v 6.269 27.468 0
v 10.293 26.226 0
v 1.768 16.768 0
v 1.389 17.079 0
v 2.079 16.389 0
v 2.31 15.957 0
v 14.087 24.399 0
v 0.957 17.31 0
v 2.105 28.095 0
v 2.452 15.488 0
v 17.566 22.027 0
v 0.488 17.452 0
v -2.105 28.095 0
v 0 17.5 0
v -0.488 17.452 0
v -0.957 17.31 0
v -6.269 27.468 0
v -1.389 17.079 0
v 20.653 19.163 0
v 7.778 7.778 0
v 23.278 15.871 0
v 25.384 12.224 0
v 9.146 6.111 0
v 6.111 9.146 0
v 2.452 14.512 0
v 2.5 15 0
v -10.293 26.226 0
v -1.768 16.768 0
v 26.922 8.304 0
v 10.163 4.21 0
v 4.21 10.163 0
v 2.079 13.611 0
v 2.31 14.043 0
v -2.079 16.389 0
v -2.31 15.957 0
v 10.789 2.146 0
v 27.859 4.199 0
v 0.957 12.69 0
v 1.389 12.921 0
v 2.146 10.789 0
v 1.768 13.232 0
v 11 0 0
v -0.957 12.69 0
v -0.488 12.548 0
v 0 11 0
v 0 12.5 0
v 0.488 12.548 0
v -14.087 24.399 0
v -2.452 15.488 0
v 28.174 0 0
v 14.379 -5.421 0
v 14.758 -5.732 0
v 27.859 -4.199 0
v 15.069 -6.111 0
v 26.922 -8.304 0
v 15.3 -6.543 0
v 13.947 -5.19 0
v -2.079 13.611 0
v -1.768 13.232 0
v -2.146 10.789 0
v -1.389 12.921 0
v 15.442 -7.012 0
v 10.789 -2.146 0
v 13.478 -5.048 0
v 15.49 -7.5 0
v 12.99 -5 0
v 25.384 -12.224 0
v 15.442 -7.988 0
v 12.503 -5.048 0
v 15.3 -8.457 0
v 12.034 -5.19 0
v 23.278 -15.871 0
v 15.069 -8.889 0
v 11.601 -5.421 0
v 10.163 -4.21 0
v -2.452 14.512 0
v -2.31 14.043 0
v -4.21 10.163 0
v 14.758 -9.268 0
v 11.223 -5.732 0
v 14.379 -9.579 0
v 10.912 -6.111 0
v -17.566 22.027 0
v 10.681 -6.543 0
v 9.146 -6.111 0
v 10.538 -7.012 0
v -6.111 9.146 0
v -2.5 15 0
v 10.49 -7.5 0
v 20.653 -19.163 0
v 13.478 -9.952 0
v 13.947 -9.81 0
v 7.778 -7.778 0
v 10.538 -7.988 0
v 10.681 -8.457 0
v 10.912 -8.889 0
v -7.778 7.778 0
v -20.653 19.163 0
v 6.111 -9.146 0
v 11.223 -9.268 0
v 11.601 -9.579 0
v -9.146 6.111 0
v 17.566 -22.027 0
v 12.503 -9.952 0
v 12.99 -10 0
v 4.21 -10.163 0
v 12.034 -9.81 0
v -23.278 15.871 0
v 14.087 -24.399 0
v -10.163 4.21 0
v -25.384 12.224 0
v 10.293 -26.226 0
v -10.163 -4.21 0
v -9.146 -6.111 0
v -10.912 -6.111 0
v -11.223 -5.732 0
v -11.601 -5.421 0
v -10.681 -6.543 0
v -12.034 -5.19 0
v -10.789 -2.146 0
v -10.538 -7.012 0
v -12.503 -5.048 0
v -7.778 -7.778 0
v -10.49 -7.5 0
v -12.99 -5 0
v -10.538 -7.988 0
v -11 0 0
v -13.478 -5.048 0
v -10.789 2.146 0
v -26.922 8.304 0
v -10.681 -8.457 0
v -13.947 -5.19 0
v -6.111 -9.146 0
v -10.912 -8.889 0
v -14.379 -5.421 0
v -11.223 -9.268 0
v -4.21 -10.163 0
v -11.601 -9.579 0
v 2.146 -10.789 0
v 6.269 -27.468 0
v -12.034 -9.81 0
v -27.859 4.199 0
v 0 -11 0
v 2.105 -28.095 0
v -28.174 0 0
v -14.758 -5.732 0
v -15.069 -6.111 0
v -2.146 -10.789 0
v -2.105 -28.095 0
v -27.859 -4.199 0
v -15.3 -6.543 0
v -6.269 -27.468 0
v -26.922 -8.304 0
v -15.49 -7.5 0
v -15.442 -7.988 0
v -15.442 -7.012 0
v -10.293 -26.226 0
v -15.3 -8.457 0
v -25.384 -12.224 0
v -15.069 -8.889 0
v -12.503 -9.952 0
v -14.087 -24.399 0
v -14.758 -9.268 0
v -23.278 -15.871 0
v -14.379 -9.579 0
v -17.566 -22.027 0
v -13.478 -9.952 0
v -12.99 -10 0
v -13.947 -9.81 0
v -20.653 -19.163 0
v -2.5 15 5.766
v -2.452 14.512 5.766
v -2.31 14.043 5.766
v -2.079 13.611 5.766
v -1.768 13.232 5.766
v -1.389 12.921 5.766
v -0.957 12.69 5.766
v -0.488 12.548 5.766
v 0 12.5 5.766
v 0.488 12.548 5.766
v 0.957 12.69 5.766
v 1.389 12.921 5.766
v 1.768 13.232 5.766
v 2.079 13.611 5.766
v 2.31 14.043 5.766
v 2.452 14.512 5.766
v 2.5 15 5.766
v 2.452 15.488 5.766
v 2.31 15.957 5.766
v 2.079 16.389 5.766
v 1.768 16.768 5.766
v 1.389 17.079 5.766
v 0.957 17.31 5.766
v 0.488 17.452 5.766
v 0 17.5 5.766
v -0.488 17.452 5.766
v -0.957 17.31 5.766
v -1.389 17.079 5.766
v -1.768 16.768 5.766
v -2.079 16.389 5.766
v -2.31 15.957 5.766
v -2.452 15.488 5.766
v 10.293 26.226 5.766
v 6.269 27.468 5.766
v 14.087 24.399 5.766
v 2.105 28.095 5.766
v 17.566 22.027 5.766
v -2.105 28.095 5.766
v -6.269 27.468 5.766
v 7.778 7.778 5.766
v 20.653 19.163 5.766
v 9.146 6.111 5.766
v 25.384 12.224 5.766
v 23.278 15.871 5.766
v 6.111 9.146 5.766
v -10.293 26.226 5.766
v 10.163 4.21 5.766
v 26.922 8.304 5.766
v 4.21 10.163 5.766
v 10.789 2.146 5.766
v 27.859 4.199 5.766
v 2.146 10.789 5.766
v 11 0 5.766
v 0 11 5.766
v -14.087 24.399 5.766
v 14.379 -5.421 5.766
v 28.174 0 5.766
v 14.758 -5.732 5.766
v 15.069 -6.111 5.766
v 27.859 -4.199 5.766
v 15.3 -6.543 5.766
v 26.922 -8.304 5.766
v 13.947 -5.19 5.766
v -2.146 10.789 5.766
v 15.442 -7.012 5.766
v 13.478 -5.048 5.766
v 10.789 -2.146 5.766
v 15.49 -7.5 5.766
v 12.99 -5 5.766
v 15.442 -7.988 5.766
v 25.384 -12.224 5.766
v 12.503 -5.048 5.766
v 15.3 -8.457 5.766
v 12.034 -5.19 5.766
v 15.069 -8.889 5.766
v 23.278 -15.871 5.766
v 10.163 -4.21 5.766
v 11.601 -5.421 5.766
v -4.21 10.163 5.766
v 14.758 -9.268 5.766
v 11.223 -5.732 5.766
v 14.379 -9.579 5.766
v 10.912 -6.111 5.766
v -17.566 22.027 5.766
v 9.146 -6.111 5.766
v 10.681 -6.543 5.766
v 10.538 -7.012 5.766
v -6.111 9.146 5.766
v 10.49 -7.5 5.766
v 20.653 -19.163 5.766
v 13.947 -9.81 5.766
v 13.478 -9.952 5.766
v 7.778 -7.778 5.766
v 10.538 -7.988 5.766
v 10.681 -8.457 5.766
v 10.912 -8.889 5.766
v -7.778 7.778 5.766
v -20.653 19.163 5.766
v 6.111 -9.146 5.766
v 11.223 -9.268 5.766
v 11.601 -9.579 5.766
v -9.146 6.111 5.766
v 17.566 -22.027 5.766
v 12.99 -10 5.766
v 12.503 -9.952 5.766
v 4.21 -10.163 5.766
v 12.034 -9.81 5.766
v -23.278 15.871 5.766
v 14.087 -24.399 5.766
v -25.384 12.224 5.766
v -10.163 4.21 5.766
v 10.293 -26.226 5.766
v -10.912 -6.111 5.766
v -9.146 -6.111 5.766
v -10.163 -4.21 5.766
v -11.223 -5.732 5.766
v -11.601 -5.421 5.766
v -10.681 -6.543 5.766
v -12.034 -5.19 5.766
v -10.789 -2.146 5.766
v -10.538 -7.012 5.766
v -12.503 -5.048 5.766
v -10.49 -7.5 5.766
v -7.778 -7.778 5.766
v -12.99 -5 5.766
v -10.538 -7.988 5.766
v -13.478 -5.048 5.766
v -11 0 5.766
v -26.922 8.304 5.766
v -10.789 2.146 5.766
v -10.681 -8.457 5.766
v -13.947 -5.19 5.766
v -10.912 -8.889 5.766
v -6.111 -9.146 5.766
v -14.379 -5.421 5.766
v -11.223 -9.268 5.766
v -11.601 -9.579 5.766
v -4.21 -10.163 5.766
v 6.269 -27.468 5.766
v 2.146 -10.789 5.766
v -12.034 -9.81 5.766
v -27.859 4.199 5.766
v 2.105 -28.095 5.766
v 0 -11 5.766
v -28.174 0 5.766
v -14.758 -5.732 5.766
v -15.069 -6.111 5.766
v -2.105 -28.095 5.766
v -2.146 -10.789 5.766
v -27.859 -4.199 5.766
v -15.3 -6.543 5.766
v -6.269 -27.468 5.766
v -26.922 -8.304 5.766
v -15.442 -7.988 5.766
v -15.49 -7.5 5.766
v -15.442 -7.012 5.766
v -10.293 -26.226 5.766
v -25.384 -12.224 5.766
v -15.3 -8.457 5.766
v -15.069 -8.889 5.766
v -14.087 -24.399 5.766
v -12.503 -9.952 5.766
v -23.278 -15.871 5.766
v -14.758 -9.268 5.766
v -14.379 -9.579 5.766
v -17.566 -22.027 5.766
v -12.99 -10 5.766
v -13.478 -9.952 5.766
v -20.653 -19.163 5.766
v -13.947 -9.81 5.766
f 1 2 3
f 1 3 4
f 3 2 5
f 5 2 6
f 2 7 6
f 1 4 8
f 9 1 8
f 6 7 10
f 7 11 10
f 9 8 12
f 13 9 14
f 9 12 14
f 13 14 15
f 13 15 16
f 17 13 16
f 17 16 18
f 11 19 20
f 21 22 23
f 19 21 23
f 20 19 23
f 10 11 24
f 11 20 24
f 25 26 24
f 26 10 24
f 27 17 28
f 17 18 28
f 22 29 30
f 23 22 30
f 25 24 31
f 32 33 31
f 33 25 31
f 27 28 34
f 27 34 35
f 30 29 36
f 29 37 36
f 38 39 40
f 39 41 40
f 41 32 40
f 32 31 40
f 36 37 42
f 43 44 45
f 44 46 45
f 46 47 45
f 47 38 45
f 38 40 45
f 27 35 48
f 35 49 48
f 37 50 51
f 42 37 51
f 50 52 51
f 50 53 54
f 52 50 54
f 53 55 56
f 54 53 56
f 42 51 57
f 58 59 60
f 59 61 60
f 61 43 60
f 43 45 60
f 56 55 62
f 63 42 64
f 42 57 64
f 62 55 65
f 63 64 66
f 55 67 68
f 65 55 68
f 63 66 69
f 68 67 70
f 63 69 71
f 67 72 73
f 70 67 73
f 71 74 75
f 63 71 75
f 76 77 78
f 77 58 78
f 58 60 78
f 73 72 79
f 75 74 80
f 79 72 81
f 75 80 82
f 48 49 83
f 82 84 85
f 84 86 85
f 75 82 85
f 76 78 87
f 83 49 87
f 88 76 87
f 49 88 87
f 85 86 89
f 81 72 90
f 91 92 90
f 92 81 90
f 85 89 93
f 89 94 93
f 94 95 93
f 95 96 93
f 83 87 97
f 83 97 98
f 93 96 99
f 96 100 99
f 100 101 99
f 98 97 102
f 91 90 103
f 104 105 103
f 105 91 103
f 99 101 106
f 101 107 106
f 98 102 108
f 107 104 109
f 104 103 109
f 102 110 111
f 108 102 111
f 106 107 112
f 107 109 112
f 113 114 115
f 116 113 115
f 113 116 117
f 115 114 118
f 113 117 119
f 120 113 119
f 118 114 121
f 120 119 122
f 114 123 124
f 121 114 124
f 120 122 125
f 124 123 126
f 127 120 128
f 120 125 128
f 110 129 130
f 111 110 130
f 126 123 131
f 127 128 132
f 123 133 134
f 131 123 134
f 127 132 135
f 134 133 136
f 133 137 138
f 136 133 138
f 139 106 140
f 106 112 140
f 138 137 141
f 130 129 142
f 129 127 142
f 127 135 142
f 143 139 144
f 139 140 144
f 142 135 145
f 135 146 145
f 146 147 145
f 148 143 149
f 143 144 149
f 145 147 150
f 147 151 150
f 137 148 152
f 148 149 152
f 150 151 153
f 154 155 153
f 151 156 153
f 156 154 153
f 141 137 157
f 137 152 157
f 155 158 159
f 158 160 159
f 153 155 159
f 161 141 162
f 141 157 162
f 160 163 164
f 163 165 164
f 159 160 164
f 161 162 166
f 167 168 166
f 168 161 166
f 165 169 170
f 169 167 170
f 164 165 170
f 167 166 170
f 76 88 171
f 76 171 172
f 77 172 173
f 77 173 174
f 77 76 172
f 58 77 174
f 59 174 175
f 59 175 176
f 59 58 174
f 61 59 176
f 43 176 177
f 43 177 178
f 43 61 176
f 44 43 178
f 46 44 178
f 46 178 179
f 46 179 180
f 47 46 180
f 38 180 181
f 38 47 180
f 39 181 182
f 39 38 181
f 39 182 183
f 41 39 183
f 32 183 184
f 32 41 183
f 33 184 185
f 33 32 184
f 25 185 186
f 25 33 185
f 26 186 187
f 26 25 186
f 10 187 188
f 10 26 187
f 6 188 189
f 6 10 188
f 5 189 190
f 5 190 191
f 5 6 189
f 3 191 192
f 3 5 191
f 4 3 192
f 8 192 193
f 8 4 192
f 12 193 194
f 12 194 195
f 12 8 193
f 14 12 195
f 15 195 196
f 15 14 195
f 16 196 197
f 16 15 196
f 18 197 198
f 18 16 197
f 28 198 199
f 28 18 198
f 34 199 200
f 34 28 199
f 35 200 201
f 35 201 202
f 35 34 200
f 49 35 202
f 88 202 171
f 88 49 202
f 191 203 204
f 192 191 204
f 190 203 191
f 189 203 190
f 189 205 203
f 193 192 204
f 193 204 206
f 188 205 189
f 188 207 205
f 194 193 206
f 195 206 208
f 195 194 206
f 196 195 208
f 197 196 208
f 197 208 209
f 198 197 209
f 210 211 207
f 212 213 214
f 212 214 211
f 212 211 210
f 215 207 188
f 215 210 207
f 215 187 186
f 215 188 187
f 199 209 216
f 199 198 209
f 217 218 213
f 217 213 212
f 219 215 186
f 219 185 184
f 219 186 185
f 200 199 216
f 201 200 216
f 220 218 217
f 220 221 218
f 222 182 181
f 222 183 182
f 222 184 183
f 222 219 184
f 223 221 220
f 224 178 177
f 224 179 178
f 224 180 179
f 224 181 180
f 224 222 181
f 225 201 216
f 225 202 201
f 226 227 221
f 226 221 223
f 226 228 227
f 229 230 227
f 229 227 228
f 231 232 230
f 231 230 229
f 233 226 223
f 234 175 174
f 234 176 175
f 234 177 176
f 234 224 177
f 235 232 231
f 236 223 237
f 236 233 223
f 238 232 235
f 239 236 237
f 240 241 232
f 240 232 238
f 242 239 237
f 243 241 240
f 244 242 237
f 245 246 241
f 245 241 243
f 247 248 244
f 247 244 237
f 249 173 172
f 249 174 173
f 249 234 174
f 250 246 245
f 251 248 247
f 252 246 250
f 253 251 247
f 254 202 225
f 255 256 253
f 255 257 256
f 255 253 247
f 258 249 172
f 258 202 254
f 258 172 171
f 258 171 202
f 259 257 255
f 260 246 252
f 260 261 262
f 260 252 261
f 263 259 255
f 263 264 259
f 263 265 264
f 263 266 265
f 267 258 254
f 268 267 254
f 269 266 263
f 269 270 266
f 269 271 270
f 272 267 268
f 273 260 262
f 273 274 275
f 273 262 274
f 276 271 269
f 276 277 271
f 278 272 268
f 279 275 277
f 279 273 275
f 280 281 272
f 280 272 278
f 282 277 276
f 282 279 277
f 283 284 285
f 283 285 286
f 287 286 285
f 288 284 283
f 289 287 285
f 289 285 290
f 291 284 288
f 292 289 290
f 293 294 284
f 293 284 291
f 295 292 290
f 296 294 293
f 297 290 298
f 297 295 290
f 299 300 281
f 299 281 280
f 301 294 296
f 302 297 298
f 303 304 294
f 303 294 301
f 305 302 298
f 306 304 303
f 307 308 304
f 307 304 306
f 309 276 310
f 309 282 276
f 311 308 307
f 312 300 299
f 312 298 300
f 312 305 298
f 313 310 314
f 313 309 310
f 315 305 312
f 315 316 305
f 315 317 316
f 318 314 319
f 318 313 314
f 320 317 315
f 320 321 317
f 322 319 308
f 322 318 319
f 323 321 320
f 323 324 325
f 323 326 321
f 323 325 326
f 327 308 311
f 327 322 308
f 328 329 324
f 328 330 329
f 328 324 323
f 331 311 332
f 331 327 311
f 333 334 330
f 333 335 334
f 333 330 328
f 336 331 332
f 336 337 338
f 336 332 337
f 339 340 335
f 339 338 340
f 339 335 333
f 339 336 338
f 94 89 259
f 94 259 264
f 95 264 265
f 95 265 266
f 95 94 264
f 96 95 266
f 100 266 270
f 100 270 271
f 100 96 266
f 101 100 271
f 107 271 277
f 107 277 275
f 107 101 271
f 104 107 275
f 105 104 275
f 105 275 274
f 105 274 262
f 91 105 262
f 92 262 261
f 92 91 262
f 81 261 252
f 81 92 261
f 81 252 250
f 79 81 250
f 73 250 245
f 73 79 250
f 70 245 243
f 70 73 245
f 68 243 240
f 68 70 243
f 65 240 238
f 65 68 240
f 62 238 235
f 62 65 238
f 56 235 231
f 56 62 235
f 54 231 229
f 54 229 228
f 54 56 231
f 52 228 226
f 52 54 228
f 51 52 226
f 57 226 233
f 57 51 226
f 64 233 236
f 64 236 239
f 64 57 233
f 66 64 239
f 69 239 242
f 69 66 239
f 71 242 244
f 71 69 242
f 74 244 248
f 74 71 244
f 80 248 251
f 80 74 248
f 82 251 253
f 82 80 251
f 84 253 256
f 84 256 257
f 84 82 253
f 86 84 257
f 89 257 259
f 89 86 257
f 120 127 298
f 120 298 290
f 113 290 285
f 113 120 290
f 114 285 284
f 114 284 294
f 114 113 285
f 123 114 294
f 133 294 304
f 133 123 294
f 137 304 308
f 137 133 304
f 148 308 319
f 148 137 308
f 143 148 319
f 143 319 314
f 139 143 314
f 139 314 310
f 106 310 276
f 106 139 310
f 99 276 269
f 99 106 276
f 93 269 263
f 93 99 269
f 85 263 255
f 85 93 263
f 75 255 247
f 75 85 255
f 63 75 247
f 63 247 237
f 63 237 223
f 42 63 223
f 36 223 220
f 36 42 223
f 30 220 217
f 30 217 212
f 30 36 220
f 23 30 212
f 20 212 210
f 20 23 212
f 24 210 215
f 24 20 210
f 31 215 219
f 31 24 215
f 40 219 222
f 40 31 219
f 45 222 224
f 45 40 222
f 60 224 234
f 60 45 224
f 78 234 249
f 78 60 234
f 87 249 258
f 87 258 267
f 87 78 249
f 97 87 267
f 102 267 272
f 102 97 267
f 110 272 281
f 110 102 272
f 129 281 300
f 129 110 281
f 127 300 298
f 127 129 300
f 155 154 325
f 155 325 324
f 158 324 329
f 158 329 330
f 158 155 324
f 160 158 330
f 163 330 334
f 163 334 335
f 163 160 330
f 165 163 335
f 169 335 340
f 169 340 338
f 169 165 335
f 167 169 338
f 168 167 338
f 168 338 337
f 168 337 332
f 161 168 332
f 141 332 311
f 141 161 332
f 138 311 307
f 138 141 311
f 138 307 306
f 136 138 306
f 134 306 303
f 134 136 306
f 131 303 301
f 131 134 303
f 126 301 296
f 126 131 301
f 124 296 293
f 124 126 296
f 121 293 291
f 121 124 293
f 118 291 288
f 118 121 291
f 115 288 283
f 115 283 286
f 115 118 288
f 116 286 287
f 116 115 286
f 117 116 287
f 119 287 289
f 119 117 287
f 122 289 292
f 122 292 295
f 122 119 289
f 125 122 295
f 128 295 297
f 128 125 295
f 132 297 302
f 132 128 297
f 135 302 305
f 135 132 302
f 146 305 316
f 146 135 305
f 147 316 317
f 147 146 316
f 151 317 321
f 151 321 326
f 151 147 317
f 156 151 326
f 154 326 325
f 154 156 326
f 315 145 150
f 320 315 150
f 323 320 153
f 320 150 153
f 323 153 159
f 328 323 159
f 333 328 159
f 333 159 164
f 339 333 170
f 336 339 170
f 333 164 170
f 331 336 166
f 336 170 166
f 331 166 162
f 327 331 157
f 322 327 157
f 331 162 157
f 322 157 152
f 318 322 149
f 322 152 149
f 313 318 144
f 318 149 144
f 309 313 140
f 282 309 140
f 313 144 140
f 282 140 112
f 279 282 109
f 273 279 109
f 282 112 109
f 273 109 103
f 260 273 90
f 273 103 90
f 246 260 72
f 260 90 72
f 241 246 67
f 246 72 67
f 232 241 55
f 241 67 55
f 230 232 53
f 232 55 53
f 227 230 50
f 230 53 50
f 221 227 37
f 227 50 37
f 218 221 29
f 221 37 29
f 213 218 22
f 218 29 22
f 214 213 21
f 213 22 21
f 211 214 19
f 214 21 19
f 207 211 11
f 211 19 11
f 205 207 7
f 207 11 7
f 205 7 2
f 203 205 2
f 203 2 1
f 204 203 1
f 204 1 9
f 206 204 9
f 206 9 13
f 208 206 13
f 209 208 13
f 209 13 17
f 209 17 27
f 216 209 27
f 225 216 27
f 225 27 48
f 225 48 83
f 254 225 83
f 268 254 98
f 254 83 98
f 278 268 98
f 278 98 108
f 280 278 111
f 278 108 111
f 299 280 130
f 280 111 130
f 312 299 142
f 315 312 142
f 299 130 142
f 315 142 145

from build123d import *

# Parameters (mm, degrees)
SKETCH1_R           = 28.173882667
SKETCH1_R_2         = 2.5
SKETCH1_R_3         = 11
BOSS_EXTRUDE1_DEPTH = 5.7658


with BuildPart() as part:
    # Sketch1 → Boss-Extrude1 (new body)
    with BuildSketch(Plane.XY):
        Circle(SKETCH1_R)
        with Locations((0, 15)):
            Circle(SKETCH1_R_2, mode=Mode.SUBTRACT)
        with Locations((12.990381057, -7.5)):
            Circle(SKETCH1_R_2, mode=Mode.SUBTRACT)
        with Locations((-12.990381057, -7.5)):
            Circle(SKETCH1_R_2, mode=Mode.SUBTRACT)
        Circle(SKETCH1_R_3, mode=Mode.SUBTRACT)
    extrude(amount=BOSS_EXTRUDE1_DEPTH)


solid = part.part
